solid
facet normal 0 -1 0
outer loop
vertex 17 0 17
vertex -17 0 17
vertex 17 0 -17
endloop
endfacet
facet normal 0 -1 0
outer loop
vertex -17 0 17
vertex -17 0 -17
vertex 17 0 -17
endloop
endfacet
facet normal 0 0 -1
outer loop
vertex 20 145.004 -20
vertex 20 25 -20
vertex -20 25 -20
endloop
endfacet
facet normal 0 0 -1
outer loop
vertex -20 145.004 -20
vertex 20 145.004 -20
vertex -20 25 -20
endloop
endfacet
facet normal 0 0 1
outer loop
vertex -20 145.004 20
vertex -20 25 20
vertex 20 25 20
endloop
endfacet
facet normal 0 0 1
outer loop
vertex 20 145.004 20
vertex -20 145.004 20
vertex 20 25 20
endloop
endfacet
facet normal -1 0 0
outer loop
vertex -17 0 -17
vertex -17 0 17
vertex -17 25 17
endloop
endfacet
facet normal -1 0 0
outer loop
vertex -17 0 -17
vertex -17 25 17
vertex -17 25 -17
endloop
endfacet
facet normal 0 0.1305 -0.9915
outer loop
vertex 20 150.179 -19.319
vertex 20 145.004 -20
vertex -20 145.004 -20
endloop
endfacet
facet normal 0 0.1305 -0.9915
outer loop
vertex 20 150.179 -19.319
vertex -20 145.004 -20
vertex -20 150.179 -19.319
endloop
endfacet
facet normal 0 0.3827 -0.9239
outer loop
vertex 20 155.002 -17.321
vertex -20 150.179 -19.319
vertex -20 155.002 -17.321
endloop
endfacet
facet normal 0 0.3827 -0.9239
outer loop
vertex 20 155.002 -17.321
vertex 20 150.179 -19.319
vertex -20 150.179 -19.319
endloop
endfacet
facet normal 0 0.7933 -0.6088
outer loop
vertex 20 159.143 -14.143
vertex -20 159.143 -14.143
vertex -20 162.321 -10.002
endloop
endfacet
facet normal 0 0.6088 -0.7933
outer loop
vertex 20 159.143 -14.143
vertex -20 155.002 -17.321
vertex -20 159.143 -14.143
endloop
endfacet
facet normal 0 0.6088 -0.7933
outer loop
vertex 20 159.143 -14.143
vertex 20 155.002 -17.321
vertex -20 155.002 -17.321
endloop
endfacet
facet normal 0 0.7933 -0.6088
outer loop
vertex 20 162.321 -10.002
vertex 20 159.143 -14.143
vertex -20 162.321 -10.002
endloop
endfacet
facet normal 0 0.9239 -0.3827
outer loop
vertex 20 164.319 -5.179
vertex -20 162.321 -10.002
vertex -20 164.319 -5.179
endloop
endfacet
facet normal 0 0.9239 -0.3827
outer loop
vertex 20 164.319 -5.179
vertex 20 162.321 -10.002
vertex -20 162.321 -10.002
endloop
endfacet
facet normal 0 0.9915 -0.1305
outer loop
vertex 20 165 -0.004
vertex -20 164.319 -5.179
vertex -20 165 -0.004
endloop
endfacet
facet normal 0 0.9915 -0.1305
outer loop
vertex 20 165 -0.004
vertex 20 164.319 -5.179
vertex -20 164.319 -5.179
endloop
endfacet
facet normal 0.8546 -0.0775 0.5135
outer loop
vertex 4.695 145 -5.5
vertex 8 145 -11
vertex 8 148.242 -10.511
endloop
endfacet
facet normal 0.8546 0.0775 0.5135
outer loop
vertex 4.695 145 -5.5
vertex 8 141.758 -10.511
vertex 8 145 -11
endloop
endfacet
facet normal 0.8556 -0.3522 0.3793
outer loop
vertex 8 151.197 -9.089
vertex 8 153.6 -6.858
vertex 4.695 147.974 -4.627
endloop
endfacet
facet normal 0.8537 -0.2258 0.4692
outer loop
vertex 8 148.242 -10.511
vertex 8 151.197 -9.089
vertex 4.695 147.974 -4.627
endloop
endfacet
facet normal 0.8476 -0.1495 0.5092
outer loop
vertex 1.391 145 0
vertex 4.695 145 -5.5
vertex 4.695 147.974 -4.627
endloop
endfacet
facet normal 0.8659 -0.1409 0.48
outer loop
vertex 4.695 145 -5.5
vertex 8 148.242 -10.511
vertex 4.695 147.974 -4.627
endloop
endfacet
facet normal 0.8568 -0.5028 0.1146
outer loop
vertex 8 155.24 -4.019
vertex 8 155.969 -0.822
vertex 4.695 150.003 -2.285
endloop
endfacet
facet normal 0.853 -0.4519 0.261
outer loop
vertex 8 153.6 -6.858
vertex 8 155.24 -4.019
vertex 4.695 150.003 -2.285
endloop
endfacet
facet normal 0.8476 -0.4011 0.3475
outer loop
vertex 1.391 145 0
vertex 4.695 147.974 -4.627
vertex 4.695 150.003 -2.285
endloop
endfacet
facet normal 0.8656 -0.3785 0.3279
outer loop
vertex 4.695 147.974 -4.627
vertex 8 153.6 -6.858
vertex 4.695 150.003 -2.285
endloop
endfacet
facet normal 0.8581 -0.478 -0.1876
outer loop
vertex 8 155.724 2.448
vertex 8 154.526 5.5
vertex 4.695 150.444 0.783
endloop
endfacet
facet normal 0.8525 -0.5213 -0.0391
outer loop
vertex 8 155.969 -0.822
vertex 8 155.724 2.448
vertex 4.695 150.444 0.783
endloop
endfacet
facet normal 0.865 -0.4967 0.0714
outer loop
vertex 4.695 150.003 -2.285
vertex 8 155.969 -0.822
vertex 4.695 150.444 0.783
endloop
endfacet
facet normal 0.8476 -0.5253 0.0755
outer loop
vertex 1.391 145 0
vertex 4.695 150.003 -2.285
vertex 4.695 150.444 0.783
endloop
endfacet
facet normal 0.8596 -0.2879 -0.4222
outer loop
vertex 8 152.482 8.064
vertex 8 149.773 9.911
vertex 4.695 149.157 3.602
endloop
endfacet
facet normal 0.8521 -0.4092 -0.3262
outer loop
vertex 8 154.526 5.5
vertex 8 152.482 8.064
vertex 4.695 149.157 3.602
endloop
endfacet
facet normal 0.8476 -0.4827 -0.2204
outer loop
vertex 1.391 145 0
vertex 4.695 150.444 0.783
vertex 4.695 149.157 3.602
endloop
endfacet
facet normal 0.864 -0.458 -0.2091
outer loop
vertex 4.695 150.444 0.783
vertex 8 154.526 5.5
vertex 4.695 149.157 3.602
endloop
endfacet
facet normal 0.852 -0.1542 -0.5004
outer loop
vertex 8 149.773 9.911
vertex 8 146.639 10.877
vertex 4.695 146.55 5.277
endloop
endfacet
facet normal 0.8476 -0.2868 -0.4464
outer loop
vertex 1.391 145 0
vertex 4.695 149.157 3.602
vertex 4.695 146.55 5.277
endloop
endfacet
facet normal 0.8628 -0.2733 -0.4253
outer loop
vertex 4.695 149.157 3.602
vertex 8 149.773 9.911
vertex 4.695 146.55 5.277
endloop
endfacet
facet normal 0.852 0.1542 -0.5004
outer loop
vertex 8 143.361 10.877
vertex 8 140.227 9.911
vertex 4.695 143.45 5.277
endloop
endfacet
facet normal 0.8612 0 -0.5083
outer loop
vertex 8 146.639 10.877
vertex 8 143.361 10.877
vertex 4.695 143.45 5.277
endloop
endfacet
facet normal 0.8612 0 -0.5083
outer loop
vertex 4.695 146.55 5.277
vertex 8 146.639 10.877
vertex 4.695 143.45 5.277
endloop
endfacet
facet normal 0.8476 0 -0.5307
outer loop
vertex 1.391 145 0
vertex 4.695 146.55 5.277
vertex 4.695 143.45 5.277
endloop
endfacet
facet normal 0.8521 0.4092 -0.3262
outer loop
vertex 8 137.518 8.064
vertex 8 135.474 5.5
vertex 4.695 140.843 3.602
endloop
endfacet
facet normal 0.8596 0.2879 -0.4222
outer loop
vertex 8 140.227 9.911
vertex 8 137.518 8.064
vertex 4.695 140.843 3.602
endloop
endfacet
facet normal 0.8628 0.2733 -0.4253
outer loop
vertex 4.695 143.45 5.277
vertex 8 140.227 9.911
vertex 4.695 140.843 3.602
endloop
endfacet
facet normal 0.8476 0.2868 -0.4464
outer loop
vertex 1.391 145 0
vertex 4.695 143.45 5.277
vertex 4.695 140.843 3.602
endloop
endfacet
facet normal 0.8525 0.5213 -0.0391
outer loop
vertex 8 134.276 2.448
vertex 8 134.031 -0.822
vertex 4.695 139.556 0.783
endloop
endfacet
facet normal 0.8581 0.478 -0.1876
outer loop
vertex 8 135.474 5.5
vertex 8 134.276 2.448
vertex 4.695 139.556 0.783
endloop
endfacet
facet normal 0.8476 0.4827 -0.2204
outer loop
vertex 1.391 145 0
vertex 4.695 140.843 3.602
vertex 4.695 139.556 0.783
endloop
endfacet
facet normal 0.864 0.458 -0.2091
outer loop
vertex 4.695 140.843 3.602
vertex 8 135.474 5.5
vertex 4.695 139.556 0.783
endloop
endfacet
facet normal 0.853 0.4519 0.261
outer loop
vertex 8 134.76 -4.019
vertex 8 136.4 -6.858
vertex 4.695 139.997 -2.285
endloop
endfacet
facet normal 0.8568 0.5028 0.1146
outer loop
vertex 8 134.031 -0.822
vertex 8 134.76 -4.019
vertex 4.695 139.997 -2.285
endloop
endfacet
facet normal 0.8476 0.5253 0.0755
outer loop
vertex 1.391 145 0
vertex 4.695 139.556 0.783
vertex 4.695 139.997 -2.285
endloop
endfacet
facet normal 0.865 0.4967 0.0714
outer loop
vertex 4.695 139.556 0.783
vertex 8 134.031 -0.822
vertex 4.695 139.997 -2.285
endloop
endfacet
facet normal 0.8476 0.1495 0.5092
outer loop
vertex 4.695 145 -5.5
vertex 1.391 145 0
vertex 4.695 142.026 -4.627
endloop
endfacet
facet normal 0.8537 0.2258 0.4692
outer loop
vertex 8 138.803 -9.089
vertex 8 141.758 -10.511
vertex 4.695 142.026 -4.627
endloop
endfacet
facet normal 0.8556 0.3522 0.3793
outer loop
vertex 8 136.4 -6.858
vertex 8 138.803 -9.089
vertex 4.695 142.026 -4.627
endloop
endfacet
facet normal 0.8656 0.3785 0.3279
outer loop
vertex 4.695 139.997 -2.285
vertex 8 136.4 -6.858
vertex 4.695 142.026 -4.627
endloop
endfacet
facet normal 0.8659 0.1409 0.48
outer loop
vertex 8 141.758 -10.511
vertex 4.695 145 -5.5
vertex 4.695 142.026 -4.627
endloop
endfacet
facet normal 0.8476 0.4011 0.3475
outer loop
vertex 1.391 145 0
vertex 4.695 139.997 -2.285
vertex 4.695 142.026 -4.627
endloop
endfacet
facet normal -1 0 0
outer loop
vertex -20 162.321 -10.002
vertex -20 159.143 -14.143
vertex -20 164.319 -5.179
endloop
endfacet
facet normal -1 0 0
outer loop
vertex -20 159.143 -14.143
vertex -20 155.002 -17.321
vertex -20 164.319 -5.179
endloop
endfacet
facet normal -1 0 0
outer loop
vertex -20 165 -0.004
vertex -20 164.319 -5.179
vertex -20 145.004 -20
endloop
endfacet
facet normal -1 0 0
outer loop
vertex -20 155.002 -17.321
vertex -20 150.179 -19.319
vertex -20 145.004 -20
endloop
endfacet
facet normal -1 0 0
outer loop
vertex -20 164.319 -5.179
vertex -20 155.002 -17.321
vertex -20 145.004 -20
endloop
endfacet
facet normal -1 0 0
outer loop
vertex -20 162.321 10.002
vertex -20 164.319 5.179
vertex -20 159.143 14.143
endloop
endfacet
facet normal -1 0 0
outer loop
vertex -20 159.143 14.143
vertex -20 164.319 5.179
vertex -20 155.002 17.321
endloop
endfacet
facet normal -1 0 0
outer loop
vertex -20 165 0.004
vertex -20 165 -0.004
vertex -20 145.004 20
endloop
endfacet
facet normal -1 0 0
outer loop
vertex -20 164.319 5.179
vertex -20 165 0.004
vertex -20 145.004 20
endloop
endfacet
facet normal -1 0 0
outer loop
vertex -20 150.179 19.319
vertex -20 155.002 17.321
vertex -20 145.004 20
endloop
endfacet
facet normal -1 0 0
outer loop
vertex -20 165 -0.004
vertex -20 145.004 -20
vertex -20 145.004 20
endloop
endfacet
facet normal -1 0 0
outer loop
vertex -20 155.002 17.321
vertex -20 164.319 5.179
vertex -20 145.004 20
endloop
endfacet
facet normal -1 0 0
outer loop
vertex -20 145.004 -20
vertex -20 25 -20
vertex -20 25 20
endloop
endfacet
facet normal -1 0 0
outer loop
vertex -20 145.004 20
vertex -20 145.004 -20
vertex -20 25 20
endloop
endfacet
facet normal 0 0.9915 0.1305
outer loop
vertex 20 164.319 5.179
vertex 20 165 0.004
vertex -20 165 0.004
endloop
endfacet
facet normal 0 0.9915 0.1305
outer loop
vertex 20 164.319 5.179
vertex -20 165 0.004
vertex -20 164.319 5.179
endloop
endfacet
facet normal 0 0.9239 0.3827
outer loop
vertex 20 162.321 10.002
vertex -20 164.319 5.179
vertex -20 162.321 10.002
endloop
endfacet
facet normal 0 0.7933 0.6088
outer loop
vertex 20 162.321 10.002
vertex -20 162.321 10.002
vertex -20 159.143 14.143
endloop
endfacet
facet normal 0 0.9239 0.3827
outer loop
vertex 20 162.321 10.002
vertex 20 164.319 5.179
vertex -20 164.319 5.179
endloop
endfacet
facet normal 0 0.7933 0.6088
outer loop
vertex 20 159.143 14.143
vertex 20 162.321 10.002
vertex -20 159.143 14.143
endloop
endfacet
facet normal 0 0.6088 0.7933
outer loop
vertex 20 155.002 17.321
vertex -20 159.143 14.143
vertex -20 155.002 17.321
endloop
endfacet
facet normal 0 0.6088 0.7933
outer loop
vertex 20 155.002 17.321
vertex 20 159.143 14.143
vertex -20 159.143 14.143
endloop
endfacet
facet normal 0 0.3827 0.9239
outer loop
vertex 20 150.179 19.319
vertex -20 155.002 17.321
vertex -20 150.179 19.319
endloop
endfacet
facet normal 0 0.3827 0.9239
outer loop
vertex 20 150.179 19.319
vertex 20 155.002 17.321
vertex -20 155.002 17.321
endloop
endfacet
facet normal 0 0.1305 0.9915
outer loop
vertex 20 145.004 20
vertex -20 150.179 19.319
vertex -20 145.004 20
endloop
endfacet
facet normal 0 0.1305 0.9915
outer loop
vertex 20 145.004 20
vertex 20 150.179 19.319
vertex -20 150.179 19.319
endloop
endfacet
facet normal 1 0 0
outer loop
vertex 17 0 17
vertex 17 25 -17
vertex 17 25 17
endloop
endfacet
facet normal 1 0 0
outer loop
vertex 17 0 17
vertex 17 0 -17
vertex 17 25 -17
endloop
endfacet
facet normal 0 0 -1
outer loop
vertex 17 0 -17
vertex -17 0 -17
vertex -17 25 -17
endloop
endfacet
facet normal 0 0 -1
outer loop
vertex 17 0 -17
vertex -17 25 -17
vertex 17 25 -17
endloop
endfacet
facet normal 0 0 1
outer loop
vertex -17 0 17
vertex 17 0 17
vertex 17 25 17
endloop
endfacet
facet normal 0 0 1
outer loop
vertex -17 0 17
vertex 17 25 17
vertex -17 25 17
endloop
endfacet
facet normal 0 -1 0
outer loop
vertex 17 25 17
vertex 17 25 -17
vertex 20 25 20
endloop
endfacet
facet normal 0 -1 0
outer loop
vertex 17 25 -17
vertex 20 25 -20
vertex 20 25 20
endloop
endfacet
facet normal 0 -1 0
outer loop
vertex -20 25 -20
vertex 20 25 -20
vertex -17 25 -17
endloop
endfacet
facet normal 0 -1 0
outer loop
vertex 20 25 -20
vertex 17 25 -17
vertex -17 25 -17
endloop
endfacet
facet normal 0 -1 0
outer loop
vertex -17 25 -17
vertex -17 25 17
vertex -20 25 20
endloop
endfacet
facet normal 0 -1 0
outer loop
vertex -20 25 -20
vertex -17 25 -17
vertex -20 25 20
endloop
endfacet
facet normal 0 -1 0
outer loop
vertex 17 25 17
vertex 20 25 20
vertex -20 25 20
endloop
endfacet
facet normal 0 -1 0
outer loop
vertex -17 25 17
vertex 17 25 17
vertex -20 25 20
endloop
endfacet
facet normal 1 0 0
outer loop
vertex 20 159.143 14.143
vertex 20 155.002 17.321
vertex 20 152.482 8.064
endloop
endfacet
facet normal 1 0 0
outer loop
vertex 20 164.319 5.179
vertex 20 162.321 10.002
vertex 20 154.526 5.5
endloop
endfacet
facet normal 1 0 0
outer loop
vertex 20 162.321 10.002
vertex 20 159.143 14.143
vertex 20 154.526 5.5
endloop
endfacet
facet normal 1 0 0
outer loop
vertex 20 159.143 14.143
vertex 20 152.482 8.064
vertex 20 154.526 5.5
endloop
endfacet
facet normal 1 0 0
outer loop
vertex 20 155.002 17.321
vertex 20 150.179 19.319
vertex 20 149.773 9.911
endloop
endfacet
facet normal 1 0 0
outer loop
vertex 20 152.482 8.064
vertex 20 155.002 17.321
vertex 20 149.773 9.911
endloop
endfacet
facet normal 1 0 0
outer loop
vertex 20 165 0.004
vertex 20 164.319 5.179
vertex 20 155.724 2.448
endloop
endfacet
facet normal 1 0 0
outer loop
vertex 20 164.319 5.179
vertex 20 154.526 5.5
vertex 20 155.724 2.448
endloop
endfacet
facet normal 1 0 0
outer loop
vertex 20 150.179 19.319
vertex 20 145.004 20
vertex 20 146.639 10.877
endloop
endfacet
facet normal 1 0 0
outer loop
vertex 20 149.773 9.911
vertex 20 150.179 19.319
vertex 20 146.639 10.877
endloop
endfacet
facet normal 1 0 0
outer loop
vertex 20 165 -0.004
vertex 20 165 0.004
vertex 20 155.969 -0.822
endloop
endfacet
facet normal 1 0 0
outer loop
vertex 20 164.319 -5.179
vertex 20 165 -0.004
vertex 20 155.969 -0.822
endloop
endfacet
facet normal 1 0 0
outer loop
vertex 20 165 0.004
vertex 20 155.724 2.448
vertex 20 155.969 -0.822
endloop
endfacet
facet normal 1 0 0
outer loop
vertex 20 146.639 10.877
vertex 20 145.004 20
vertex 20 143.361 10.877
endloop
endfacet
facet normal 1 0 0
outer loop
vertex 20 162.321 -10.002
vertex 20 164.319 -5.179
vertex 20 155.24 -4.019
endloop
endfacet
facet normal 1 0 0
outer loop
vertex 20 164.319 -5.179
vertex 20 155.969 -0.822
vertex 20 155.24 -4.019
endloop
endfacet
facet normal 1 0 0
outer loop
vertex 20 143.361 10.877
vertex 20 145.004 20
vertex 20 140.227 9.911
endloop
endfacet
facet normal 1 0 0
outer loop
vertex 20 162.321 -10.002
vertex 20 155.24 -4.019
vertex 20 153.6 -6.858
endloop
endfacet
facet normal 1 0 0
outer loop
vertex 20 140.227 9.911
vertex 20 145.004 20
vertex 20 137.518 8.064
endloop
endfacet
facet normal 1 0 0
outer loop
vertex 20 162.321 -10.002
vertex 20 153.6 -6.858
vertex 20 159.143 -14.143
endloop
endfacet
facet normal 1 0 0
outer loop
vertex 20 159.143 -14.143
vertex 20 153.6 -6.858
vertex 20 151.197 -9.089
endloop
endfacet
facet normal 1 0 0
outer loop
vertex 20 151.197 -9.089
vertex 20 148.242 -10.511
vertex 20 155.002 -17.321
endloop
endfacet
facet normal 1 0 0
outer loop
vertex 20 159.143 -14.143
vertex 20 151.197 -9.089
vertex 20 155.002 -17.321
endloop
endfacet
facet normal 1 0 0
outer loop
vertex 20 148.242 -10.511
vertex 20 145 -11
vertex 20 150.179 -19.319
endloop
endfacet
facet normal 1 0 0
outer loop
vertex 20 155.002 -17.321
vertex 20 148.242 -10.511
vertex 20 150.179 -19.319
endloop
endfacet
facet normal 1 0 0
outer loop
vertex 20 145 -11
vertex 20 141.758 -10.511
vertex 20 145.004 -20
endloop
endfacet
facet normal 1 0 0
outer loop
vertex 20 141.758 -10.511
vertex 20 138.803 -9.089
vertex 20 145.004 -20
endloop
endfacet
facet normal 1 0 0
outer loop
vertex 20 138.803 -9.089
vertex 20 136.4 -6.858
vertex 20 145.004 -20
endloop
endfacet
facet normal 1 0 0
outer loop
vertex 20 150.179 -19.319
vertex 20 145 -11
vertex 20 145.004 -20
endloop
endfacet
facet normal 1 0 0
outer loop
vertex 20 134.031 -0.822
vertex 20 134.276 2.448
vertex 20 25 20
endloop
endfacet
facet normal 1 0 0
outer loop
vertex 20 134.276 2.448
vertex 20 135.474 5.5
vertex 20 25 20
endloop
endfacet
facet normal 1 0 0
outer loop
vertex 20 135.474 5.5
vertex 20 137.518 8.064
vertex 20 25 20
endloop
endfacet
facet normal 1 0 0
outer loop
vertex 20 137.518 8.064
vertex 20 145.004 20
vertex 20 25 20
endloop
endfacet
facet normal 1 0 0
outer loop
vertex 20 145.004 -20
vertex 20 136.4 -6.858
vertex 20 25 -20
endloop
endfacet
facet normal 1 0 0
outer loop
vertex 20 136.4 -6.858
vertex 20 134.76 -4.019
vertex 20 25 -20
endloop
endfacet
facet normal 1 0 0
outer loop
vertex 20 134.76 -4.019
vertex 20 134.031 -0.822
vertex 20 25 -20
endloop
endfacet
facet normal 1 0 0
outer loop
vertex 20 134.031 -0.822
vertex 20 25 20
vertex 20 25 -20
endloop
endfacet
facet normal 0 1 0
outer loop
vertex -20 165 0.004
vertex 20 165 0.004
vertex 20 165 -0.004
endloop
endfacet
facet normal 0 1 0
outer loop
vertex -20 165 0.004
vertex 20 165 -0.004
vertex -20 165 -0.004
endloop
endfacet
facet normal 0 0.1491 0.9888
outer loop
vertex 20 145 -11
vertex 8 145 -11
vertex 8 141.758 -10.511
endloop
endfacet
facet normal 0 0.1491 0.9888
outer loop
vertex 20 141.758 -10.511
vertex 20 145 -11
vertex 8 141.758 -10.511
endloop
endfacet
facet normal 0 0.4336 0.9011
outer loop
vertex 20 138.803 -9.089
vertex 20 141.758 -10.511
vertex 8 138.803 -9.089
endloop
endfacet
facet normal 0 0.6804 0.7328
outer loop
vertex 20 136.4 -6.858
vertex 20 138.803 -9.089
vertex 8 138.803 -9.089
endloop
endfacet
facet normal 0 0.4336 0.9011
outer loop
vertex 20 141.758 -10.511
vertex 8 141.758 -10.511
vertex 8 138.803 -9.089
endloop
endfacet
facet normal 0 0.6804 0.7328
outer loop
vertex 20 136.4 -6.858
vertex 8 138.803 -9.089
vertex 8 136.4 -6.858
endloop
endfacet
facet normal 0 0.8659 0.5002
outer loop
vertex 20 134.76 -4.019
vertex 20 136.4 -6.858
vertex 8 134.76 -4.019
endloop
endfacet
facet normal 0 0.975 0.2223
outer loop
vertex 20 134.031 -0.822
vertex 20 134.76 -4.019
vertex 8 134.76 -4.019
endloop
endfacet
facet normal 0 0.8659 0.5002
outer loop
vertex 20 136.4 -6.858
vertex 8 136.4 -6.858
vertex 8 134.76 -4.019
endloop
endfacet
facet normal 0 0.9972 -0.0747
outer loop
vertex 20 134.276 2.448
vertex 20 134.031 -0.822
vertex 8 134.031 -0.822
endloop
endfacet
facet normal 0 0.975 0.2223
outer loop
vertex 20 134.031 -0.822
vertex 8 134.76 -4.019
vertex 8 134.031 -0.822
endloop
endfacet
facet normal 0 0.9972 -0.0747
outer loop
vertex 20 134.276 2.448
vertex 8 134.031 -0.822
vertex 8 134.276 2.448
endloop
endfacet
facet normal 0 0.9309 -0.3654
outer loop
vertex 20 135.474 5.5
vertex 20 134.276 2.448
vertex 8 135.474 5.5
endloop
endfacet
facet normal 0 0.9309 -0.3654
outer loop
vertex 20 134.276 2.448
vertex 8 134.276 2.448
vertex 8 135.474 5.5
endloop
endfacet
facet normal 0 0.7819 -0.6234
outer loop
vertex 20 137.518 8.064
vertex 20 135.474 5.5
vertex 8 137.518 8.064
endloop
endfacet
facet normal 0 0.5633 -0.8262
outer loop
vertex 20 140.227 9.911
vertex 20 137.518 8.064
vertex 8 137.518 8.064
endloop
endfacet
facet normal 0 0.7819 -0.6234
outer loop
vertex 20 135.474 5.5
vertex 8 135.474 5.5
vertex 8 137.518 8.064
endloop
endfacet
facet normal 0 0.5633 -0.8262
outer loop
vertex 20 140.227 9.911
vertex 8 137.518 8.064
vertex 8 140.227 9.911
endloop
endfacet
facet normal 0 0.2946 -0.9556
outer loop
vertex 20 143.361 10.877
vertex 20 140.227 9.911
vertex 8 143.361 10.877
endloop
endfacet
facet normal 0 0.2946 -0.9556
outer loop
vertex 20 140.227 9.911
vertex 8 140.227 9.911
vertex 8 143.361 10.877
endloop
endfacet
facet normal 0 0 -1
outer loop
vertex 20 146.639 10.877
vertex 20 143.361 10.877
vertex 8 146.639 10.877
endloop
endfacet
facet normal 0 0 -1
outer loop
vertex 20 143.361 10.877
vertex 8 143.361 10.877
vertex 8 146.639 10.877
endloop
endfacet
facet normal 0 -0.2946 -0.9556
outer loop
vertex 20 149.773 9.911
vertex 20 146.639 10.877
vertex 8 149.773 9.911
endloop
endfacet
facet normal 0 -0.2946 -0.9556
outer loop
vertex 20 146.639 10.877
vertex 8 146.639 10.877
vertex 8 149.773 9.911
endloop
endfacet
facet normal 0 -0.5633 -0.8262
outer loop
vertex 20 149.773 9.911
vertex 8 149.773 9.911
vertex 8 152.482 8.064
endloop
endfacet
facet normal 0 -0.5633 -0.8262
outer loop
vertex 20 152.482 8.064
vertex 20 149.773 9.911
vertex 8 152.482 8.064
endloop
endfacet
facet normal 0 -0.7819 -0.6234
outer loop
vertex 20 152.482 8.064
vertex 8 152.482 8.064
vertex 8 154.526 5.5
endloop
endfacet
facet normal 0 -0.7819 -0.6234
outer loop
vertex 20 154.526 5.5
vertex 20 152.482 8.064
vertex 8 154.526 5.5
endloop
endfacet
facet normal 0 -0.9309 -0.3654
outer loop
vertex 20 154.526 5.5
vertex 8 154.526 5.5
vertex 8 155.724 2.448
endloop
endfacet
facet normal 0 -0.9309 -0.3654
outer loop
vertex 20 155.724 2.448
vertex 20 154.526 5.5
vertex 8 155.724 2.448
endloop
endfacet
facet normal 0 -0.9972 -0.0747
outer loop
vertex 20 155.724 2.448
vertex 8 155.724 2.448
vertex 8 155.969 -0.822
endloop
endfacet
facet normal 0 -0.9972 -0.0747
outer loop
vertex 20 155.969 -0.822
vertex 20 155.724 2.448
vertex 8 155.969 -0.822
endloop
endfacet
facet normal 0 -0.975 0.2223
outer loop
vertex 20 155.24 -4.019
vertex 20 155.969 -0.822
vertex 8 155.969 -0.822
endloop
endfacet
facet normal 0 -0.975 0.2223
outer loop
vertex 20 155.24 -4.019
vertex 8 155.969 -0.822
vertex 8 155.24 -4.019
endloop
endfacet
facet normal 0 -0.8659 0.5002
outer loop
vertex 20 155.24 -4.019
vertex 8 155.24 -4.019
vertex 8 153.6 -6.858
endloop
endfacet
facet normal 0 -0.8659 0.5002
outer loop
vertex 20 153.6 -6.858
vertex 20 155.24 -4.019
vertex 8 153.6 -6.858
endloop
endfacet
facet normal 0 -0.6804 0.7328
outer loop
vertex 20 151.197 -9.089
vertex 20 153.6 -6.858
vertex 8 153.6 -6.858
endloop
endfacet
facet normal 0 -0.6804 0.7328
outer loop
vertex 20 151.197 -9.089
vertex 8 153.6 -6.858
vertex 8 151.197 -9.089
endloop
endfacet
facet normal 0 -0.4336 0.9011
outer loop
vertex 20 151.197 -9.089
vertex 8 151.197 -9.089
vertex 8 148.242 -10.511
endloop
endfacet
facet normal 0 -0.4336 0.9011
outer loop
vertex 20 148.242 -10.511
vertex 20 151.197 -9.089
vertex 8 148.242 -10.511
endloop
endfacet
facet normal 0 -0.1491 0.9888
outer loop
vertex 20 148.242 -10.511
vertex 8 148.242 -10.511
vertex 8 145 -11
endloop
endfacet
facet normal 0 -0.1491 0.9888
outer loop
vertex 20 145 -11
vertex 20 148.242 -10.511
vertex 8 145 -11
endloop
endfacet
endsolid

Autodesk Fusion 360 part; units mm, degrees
sketch "Sketch1" plane through (0, 0, 0) normal (0, 1, 0) x (1, 0, 0)
  line L0 (0, 17) -> (17, 17)
  line L1 (17, 17) -> (17, -17)
  line L2 (17, -17) -> (-17, -17)
  line L3 (-17, -17) -> (-17, 17)
  line L4 (-17, 17) -> (0, 17)
  dimension "d4" = 34
  dimension "d5" = 34
extrude "Extrude1" add sketch "Sketch1" along normal blind 25
sketch "Sketch2" plane through (0, 25, 0) normal (0, 1, 0) x (-1, 0, 0)
  line L0 (17, -17) -> (17, 17)
  line L1 (17, 17) -> (-17, 17)
  line L2 (-17, 17) -> (-17, -17)
  line L3 (-17, -17) -> (17, -17)
  line L4 (0, -20) -> (20, -20)
  line L5 (20, -20) -> (20, 20)
  line L6 (20, 20) -> (-20, 20)
  line L7 (-20, 20) -> (-20, -20)
  line L8 (-20, -20) -> (0, -20)
  dimension "d12" = 40
extrude "Extrude2" add sketch "Sketch2" along normal blind 140 contours L0 L1 L2 L3 | L4 L5 L6 L7 L8
sketch "Sketch3" plane through (0, 165, 0) normal (0, 1, 0) x (-1, 0, 0)
  line L0 (-20, -20) -> (20, -20)
  line L1 (20, -20) -> (20, 20)
  line L2 (20, 20) -> (-20, 20)
  line L3 (-20, 20) -> (-20, -20)
  line L4 (0, -17) -> (17, -17)
  line L5 (17, -17) -> (17, 17)
  line L6 (17, 17) -> (-17, 17)
  line L7 (-17, 17) -> (-17, -17)
  line L8 (-17, -17) -> (0, -17)
  dimension "d19" = 34
extrude "Extrude3" cut sketch "Sketch3" against normal blind 25 contours L4 L5 L6 L7 L8
extrude "Extrude4" add 1 faces at (5.6667, 140, -5.6667) along direction (0, 1, 0) blind 25
fillet "Fillet1" radius 20 2 edges at (0, 165, 20) (0, 165, -20)
hole "Hole1" at (20, 145, 0) direction (-1, 0, 0) diameter 22 depth 12 tip angle 118
